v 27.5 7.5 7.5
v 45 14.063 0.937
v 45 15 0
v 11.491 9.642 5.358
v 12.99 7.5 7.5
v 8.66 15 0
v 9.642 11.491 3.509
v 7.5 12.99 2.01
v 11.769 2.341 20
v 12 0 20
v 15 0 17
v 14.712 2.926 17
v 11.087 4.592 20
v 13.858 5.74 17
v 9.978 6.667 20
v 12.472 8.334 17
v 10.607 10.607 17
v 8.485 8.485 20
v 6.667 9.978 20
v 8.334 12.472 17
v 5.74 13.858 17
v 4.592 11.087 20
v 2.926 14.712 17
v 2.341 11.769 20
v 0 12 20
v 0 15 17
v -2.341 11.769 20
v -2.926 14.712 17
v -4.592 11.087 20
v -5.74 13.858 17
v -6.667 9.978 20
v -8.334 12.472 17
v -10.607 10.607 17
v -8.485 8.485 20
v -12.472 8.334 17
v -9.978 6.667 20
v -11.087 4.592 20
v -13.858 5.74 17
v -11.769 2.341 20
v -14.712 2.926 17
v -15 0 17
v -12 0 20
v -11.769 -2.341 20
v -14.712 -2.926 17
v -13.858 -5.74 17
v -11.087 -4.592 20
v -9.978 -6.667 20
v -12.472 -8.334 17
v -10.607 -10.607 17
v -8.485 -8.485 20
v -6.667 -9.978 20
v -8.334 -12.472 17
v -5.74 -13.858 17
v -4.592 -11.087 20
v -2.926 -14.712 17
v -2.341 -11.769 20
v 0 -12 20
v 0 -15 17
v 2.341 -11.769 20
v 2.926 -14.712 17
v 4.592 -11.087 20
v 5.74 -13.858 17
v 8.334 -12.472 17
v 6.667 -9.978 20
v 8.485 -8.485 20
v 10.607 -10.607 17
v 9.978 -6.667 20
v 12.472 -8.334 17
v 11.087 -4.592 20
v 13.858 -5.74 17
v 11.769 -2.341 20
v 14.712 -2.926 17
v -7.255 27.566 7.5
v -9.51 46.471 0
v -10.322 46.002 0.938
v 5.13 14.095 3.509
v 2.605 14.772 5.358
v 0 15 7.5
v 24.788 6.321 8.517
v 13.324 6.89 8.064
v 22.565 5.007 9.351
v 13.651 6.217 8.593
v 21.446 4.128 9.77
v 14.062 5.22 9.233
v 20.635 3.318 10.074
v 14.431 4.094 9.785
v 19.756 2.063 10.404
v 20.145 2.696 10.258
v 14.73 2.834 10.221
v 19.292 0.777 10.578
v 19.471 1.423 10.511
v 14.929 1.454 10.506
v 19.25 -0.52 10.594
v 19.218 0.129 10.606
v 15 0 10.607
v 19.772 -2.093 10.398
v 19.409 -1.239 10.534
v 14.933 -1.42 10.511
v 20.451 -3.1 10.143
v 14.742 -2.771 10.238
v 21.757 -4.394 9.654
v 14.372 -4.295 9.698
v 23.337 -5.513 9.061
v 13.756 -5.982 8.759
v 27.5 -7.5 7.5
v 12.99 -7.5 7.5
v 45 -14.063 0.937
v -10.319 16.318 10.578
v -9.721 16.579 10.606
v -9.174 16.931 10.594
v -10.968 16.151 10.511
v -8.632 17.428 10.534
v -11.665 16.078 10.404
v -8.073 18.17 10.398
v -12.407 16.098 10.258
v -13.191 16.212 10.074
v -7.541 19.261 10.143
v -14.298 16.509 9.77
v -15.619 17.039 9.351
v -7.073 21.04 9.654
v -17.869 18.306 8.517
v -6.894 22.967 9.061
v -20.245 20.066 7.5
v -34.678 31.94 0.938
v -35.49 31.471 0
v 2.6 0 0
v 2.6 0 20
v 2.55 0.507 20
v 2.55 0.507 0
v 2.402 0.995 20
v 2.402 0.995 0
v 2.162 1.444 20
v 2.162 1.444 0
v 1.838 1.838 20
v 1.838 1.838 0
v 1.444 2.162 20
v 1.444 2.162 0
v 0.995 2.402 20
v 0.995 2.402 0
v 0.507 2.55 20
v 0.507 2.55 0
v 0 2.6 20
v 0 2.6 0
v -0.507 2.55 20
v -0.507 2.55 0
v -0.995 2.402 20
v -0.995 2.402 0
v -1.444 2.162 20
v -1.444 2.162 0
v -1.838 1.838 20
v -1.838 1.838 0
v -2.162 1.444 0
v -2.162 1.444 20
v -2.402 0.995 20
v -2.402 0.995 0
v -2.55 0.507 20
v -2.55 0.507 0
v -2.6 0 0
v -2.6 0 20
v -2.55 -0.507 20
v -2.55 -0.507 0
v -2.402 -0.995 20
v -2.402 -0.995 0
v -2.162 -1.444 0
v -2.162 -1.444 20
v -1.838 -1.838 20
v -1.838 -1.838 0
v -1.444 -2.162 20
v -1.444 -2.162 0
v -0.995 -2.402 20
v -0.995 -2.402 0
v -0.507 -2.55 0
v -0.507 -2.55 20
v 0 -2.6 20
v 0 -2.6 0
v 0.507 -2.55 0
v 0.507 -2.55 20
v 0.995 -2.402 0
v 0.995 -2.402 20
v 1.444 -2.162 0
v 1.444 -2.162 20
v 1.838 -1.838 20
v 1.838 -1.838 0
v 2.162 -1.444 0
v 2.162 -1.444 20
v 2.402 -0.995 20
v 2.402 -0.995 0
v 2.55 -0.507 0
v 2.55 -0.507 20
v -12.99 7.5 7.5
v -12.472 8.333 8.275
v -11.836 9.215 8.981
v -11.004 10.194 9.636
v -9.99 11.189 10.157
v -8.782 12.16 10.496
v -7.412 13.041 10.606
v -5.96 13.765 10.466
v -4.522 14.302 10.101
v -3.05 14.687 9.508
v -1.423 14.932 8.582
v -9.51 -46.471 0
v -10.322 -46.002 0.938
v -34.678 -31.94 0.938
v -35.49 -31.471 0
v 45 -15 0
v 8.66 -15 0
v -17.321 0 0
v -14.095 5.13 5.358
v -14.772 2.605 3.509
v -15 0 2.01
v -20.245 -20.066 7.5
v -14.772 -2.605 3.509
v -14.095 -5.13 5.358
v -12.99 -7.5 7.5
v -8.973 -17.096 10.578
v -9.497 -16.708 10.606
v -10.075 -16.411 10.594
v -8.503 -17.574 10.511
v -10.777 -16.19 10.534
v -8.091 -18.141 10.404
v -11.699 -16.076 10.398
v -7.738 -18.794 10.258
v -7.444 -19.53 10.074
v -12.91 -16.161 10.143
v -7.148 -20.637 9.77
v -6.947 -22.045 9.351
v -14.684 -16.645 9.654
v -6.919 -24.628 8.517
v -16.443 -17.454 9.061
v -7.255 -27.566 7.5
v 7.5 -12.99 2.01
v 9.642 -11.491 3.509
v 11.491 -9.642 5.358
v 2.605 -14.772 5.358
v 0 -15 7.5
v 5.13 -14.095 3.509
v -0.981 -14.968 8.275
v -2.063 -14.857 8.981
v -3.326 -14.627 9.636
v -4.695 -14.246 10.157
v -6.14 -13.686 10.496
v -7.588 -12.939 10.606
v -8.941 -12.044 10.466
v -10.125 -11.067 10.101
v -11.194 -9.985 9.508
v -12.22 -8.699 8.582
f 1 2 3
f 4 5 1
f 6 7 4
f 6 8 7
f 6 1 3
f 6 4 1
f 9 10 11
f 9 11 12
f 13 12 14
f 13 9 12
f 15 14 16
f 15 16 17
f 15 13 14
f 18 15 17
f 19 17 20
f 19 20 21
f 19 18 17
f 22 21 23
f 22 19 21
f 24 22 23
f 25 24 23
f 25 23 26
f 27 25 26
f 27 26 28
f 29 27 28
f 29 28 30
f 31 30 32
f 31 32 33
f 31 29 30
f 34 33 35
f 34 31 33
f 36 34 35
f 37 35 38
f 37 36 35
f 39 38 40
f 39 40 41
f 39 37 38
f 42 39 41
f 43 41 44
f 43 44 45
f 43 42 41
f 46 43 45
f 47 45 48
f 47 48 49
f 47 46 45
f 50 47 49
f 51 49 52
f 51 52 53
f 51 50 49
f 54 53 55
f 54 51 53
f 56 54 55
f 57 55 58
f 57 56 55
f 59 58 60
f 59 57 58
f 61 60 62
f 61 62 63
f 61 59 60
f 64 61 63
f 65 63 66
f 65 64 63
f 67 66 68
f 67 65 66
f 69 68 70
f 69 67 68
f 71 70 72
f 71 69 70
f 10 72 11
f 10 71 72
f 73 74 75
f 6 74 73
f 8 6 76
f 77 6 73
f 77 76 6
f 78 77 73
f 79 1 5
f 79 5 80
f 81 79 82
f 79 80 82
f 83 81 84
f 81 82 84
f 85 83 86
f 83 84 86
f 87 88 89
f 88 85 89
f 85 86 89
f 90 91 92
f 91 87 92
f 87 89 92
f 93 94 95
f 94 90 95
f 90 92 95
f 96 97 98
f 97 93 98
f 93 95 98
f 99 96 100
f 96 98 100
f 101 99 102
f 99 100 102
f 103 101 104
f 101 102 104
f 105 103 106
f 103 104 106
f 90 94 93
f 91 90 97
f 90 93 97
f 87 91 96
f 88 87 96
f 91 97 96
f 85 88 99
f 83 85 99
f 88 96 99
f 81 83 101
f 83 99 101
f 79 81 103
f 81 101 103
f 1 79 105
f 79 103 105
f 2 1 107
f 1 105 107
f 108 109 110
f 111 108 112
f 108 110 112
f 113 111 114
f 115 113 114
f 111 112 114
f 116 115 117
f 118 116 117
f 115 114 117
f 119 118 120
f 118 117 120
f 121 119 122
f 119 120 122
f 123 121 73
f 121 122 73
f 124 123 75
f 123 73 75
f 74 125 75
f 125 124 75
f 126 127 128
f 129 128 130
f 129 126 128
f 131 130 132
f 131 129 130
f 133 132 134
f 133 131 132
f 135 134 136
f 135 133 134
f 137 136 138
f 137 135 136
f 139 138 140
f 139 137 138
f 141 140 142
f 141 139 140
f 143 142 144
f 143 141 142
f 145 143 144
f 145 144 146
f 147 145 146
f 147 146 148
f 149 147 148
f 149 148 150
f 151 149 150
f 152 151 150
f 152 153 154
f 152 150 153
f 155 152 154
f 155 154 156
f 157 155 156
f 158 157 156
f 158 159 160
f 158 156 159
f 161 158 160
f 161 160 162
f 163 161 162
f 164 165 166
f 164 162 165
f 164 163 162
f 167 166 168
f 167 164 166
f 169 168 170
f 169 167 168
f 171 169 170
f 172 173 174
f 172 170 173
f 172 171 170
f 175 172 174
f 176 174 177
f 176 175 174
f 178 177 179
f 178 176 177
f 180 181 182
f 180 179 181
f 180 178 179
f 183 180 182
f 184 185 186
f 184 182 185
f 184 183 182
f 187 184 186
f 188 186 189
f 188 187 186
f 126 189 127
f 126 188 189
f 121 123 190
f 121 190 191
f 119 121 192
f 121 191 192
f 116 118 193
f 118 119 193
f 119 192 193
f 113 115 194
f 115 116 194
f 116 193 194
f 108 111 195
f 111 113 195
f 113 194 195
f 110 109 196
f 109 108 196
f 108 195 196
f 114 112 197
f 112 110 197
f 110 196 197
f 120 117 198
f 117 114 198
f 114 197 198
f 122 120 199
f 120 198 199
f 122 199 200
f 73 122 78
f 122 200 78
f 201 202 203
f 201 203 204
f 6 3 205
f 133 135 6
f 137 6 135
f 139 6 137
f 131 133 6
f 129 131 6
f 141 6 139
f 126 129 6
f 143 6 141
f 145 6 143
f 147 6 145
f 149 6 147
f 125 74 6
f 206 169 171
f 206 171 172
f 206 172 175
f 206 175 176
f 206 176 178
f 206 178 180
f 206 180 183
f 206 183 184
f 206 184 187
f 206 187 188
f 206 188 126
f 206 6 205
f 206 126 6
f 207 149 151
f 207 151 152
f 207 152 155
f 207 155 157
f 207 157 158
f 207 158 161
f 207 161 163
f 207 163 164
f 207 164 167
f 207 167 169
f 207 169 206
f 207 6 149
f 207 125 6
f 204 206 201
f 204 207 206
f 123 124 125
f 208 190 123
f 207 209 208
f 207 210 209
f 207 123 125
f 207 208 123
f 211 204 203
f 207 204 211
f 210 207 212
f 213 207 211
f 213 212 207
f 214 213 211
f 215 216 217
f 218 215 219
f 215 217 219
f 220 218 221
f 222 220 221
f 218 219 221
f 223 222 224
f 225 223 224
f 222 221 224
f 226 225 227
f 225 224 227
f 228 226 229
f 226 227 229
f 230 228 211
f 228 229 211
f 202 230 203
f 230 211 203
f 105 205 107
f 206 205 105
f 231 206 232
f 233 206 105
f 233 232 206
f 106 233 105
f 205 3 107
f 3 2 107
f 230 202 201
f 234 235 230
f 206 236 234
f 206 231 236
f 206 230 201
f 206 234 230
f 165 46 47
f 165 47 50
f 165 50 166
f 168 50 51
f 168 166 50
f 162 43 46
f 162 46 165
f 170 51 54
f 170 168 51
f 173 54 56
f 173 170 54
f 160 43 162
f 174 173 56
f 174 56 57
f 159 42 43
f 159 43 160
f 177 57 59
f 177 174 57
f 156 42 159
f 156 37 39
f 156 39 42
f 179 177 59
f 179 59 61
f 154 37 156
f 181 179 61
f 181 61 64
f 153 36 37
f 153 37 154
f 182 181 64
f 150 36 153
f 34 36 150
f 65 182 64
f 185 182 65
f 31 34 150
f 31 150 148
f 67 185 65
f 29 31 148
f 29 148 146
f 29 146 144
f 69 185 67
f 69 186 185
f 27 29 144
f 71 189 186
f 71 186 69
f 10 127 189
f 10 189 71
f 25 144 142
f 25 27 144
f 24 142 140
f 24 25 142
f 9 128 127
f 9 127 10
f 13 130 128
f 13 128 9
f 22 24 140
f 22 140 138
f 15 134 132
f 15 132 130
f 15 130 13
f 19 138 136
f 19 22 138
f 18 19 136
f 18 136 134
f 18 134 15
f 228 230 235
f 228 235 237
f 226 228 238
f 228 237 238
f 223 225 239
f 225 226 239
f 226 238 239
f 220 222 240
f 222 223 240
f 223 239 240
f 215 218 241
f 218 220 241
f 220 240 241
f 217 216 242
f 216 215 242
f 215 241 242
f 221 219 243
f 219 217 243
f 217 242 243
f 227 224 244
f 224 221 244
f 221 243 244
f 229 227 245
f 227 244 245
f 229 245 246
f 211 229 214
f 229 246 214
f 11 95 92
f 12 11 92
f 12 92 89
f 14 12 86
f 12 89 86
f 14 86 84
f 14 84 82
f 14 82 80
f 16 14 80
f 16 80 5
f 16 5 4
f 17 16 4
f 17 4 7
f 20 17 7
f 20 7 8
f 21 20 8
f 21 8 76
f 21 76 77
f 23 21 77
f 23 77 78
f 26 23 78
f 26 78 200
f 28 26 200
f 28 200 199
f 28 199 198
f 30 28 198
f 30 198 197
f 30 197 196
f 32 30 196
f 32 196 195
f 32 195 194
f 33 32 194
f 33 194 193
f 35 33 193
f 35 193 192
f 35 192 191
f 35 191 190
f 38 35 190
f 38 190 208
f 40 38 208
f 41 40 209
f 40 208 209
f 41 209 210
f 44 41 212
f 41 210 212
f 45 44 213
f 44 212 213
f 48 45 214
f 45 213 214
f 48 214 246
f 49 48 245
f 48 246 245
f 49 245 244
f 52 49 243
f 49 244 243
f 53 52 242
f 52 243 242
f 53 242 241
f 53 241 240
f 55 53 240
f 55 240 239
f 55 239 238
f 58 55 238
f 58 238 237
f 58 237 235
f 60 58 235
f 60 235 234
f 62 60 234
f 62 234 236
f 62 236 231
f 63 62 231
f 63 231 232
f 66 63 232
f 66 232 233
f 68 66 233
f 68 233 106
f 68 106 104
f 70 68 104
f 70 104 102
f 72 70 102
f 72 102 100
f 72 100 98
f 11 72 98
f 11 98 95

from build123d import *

# Parameters (mm, degrees)
SKETCH_R              = 15
PAD_DEPTH             = 20
PAD001_DEPTH          = 45
POLARPATTERN_COUNT    = 3
CHAMFER_SIZE          = 3
CYLINDER_R            = 2.6
CYLINDER_DEPTH        = 30
POCKET_DEPTH          = 15
POLARPATTERN001_COUNT = 3


with BuildPart() as part:
    # Sketch → Pad (new body)
    with BuildSketch(Plane.XY):
        Circle(SKETCH_R)
    extrude(amount=PAD_DEPTH)

    # Sketch001 → Pad001 (join)
    with BuildSketch(Plane.YZ):
        with BuildLine():
            Line((-15, 0), (-7.5, 7.5))
            ThreePointArc((7.5, 7.5), (0, 10.606602), (-7.5, 7.5))
            Line((7.5, 7.5), (15, 0))
            Line((15, 0), (-15, 0))
        make_face()
    pad001 = extrude(amount=PAD001_DEPTH)

    # PolarPattern: Pad001 ×3 about axis
    polarpattern_axis = Axis((0, 0, 0), (0, 0, 1))
    for i in range(1, POLARPATTERN_COUNT):
        add(pad001.rotate(polarpattern_axis, i * 360 / POLARPATTERN_COUNT))

    # Chamfer
    chamfer_edges = [part.edges().sort_by_distance(p)[0] for p in [
        (-15, 0, 20),
    ]]
    chamfer(chamfer_edges, length=CHAMFER_SIZE)

    # Cylinder → Cylinder (cut)
    with BuildSketch(Plane.XY):
        Circle(CYLINDER_R)
    extrude(amount=CYLINDER_DEPTH, mode=Mode.SUBTRACT)

    # Sketch002 → Pocket (cut, symmetric)
    with BuildSketch(Plane.XZ):
        Polygon((15.5, 12), (47.5, 0), (47.5, 12), align=None)
    pocket = extrude(amount=POCKET_DEPTH, both=True, mode=Mode.SUBTRACT)

    # PolarPattern001: Pocket ×3 about axis
    polarpattern001_axis = Axis((0, 0, 0), (0, 0, 1))
    for i in range(1, POLARPATTERN001_COUNT):
        add(pocket.rotate(polarpattern001_axis, i * 360 / POLARPATTERN001_COUNT), mode=Mode.SUBTRACT)


solid = part.part
